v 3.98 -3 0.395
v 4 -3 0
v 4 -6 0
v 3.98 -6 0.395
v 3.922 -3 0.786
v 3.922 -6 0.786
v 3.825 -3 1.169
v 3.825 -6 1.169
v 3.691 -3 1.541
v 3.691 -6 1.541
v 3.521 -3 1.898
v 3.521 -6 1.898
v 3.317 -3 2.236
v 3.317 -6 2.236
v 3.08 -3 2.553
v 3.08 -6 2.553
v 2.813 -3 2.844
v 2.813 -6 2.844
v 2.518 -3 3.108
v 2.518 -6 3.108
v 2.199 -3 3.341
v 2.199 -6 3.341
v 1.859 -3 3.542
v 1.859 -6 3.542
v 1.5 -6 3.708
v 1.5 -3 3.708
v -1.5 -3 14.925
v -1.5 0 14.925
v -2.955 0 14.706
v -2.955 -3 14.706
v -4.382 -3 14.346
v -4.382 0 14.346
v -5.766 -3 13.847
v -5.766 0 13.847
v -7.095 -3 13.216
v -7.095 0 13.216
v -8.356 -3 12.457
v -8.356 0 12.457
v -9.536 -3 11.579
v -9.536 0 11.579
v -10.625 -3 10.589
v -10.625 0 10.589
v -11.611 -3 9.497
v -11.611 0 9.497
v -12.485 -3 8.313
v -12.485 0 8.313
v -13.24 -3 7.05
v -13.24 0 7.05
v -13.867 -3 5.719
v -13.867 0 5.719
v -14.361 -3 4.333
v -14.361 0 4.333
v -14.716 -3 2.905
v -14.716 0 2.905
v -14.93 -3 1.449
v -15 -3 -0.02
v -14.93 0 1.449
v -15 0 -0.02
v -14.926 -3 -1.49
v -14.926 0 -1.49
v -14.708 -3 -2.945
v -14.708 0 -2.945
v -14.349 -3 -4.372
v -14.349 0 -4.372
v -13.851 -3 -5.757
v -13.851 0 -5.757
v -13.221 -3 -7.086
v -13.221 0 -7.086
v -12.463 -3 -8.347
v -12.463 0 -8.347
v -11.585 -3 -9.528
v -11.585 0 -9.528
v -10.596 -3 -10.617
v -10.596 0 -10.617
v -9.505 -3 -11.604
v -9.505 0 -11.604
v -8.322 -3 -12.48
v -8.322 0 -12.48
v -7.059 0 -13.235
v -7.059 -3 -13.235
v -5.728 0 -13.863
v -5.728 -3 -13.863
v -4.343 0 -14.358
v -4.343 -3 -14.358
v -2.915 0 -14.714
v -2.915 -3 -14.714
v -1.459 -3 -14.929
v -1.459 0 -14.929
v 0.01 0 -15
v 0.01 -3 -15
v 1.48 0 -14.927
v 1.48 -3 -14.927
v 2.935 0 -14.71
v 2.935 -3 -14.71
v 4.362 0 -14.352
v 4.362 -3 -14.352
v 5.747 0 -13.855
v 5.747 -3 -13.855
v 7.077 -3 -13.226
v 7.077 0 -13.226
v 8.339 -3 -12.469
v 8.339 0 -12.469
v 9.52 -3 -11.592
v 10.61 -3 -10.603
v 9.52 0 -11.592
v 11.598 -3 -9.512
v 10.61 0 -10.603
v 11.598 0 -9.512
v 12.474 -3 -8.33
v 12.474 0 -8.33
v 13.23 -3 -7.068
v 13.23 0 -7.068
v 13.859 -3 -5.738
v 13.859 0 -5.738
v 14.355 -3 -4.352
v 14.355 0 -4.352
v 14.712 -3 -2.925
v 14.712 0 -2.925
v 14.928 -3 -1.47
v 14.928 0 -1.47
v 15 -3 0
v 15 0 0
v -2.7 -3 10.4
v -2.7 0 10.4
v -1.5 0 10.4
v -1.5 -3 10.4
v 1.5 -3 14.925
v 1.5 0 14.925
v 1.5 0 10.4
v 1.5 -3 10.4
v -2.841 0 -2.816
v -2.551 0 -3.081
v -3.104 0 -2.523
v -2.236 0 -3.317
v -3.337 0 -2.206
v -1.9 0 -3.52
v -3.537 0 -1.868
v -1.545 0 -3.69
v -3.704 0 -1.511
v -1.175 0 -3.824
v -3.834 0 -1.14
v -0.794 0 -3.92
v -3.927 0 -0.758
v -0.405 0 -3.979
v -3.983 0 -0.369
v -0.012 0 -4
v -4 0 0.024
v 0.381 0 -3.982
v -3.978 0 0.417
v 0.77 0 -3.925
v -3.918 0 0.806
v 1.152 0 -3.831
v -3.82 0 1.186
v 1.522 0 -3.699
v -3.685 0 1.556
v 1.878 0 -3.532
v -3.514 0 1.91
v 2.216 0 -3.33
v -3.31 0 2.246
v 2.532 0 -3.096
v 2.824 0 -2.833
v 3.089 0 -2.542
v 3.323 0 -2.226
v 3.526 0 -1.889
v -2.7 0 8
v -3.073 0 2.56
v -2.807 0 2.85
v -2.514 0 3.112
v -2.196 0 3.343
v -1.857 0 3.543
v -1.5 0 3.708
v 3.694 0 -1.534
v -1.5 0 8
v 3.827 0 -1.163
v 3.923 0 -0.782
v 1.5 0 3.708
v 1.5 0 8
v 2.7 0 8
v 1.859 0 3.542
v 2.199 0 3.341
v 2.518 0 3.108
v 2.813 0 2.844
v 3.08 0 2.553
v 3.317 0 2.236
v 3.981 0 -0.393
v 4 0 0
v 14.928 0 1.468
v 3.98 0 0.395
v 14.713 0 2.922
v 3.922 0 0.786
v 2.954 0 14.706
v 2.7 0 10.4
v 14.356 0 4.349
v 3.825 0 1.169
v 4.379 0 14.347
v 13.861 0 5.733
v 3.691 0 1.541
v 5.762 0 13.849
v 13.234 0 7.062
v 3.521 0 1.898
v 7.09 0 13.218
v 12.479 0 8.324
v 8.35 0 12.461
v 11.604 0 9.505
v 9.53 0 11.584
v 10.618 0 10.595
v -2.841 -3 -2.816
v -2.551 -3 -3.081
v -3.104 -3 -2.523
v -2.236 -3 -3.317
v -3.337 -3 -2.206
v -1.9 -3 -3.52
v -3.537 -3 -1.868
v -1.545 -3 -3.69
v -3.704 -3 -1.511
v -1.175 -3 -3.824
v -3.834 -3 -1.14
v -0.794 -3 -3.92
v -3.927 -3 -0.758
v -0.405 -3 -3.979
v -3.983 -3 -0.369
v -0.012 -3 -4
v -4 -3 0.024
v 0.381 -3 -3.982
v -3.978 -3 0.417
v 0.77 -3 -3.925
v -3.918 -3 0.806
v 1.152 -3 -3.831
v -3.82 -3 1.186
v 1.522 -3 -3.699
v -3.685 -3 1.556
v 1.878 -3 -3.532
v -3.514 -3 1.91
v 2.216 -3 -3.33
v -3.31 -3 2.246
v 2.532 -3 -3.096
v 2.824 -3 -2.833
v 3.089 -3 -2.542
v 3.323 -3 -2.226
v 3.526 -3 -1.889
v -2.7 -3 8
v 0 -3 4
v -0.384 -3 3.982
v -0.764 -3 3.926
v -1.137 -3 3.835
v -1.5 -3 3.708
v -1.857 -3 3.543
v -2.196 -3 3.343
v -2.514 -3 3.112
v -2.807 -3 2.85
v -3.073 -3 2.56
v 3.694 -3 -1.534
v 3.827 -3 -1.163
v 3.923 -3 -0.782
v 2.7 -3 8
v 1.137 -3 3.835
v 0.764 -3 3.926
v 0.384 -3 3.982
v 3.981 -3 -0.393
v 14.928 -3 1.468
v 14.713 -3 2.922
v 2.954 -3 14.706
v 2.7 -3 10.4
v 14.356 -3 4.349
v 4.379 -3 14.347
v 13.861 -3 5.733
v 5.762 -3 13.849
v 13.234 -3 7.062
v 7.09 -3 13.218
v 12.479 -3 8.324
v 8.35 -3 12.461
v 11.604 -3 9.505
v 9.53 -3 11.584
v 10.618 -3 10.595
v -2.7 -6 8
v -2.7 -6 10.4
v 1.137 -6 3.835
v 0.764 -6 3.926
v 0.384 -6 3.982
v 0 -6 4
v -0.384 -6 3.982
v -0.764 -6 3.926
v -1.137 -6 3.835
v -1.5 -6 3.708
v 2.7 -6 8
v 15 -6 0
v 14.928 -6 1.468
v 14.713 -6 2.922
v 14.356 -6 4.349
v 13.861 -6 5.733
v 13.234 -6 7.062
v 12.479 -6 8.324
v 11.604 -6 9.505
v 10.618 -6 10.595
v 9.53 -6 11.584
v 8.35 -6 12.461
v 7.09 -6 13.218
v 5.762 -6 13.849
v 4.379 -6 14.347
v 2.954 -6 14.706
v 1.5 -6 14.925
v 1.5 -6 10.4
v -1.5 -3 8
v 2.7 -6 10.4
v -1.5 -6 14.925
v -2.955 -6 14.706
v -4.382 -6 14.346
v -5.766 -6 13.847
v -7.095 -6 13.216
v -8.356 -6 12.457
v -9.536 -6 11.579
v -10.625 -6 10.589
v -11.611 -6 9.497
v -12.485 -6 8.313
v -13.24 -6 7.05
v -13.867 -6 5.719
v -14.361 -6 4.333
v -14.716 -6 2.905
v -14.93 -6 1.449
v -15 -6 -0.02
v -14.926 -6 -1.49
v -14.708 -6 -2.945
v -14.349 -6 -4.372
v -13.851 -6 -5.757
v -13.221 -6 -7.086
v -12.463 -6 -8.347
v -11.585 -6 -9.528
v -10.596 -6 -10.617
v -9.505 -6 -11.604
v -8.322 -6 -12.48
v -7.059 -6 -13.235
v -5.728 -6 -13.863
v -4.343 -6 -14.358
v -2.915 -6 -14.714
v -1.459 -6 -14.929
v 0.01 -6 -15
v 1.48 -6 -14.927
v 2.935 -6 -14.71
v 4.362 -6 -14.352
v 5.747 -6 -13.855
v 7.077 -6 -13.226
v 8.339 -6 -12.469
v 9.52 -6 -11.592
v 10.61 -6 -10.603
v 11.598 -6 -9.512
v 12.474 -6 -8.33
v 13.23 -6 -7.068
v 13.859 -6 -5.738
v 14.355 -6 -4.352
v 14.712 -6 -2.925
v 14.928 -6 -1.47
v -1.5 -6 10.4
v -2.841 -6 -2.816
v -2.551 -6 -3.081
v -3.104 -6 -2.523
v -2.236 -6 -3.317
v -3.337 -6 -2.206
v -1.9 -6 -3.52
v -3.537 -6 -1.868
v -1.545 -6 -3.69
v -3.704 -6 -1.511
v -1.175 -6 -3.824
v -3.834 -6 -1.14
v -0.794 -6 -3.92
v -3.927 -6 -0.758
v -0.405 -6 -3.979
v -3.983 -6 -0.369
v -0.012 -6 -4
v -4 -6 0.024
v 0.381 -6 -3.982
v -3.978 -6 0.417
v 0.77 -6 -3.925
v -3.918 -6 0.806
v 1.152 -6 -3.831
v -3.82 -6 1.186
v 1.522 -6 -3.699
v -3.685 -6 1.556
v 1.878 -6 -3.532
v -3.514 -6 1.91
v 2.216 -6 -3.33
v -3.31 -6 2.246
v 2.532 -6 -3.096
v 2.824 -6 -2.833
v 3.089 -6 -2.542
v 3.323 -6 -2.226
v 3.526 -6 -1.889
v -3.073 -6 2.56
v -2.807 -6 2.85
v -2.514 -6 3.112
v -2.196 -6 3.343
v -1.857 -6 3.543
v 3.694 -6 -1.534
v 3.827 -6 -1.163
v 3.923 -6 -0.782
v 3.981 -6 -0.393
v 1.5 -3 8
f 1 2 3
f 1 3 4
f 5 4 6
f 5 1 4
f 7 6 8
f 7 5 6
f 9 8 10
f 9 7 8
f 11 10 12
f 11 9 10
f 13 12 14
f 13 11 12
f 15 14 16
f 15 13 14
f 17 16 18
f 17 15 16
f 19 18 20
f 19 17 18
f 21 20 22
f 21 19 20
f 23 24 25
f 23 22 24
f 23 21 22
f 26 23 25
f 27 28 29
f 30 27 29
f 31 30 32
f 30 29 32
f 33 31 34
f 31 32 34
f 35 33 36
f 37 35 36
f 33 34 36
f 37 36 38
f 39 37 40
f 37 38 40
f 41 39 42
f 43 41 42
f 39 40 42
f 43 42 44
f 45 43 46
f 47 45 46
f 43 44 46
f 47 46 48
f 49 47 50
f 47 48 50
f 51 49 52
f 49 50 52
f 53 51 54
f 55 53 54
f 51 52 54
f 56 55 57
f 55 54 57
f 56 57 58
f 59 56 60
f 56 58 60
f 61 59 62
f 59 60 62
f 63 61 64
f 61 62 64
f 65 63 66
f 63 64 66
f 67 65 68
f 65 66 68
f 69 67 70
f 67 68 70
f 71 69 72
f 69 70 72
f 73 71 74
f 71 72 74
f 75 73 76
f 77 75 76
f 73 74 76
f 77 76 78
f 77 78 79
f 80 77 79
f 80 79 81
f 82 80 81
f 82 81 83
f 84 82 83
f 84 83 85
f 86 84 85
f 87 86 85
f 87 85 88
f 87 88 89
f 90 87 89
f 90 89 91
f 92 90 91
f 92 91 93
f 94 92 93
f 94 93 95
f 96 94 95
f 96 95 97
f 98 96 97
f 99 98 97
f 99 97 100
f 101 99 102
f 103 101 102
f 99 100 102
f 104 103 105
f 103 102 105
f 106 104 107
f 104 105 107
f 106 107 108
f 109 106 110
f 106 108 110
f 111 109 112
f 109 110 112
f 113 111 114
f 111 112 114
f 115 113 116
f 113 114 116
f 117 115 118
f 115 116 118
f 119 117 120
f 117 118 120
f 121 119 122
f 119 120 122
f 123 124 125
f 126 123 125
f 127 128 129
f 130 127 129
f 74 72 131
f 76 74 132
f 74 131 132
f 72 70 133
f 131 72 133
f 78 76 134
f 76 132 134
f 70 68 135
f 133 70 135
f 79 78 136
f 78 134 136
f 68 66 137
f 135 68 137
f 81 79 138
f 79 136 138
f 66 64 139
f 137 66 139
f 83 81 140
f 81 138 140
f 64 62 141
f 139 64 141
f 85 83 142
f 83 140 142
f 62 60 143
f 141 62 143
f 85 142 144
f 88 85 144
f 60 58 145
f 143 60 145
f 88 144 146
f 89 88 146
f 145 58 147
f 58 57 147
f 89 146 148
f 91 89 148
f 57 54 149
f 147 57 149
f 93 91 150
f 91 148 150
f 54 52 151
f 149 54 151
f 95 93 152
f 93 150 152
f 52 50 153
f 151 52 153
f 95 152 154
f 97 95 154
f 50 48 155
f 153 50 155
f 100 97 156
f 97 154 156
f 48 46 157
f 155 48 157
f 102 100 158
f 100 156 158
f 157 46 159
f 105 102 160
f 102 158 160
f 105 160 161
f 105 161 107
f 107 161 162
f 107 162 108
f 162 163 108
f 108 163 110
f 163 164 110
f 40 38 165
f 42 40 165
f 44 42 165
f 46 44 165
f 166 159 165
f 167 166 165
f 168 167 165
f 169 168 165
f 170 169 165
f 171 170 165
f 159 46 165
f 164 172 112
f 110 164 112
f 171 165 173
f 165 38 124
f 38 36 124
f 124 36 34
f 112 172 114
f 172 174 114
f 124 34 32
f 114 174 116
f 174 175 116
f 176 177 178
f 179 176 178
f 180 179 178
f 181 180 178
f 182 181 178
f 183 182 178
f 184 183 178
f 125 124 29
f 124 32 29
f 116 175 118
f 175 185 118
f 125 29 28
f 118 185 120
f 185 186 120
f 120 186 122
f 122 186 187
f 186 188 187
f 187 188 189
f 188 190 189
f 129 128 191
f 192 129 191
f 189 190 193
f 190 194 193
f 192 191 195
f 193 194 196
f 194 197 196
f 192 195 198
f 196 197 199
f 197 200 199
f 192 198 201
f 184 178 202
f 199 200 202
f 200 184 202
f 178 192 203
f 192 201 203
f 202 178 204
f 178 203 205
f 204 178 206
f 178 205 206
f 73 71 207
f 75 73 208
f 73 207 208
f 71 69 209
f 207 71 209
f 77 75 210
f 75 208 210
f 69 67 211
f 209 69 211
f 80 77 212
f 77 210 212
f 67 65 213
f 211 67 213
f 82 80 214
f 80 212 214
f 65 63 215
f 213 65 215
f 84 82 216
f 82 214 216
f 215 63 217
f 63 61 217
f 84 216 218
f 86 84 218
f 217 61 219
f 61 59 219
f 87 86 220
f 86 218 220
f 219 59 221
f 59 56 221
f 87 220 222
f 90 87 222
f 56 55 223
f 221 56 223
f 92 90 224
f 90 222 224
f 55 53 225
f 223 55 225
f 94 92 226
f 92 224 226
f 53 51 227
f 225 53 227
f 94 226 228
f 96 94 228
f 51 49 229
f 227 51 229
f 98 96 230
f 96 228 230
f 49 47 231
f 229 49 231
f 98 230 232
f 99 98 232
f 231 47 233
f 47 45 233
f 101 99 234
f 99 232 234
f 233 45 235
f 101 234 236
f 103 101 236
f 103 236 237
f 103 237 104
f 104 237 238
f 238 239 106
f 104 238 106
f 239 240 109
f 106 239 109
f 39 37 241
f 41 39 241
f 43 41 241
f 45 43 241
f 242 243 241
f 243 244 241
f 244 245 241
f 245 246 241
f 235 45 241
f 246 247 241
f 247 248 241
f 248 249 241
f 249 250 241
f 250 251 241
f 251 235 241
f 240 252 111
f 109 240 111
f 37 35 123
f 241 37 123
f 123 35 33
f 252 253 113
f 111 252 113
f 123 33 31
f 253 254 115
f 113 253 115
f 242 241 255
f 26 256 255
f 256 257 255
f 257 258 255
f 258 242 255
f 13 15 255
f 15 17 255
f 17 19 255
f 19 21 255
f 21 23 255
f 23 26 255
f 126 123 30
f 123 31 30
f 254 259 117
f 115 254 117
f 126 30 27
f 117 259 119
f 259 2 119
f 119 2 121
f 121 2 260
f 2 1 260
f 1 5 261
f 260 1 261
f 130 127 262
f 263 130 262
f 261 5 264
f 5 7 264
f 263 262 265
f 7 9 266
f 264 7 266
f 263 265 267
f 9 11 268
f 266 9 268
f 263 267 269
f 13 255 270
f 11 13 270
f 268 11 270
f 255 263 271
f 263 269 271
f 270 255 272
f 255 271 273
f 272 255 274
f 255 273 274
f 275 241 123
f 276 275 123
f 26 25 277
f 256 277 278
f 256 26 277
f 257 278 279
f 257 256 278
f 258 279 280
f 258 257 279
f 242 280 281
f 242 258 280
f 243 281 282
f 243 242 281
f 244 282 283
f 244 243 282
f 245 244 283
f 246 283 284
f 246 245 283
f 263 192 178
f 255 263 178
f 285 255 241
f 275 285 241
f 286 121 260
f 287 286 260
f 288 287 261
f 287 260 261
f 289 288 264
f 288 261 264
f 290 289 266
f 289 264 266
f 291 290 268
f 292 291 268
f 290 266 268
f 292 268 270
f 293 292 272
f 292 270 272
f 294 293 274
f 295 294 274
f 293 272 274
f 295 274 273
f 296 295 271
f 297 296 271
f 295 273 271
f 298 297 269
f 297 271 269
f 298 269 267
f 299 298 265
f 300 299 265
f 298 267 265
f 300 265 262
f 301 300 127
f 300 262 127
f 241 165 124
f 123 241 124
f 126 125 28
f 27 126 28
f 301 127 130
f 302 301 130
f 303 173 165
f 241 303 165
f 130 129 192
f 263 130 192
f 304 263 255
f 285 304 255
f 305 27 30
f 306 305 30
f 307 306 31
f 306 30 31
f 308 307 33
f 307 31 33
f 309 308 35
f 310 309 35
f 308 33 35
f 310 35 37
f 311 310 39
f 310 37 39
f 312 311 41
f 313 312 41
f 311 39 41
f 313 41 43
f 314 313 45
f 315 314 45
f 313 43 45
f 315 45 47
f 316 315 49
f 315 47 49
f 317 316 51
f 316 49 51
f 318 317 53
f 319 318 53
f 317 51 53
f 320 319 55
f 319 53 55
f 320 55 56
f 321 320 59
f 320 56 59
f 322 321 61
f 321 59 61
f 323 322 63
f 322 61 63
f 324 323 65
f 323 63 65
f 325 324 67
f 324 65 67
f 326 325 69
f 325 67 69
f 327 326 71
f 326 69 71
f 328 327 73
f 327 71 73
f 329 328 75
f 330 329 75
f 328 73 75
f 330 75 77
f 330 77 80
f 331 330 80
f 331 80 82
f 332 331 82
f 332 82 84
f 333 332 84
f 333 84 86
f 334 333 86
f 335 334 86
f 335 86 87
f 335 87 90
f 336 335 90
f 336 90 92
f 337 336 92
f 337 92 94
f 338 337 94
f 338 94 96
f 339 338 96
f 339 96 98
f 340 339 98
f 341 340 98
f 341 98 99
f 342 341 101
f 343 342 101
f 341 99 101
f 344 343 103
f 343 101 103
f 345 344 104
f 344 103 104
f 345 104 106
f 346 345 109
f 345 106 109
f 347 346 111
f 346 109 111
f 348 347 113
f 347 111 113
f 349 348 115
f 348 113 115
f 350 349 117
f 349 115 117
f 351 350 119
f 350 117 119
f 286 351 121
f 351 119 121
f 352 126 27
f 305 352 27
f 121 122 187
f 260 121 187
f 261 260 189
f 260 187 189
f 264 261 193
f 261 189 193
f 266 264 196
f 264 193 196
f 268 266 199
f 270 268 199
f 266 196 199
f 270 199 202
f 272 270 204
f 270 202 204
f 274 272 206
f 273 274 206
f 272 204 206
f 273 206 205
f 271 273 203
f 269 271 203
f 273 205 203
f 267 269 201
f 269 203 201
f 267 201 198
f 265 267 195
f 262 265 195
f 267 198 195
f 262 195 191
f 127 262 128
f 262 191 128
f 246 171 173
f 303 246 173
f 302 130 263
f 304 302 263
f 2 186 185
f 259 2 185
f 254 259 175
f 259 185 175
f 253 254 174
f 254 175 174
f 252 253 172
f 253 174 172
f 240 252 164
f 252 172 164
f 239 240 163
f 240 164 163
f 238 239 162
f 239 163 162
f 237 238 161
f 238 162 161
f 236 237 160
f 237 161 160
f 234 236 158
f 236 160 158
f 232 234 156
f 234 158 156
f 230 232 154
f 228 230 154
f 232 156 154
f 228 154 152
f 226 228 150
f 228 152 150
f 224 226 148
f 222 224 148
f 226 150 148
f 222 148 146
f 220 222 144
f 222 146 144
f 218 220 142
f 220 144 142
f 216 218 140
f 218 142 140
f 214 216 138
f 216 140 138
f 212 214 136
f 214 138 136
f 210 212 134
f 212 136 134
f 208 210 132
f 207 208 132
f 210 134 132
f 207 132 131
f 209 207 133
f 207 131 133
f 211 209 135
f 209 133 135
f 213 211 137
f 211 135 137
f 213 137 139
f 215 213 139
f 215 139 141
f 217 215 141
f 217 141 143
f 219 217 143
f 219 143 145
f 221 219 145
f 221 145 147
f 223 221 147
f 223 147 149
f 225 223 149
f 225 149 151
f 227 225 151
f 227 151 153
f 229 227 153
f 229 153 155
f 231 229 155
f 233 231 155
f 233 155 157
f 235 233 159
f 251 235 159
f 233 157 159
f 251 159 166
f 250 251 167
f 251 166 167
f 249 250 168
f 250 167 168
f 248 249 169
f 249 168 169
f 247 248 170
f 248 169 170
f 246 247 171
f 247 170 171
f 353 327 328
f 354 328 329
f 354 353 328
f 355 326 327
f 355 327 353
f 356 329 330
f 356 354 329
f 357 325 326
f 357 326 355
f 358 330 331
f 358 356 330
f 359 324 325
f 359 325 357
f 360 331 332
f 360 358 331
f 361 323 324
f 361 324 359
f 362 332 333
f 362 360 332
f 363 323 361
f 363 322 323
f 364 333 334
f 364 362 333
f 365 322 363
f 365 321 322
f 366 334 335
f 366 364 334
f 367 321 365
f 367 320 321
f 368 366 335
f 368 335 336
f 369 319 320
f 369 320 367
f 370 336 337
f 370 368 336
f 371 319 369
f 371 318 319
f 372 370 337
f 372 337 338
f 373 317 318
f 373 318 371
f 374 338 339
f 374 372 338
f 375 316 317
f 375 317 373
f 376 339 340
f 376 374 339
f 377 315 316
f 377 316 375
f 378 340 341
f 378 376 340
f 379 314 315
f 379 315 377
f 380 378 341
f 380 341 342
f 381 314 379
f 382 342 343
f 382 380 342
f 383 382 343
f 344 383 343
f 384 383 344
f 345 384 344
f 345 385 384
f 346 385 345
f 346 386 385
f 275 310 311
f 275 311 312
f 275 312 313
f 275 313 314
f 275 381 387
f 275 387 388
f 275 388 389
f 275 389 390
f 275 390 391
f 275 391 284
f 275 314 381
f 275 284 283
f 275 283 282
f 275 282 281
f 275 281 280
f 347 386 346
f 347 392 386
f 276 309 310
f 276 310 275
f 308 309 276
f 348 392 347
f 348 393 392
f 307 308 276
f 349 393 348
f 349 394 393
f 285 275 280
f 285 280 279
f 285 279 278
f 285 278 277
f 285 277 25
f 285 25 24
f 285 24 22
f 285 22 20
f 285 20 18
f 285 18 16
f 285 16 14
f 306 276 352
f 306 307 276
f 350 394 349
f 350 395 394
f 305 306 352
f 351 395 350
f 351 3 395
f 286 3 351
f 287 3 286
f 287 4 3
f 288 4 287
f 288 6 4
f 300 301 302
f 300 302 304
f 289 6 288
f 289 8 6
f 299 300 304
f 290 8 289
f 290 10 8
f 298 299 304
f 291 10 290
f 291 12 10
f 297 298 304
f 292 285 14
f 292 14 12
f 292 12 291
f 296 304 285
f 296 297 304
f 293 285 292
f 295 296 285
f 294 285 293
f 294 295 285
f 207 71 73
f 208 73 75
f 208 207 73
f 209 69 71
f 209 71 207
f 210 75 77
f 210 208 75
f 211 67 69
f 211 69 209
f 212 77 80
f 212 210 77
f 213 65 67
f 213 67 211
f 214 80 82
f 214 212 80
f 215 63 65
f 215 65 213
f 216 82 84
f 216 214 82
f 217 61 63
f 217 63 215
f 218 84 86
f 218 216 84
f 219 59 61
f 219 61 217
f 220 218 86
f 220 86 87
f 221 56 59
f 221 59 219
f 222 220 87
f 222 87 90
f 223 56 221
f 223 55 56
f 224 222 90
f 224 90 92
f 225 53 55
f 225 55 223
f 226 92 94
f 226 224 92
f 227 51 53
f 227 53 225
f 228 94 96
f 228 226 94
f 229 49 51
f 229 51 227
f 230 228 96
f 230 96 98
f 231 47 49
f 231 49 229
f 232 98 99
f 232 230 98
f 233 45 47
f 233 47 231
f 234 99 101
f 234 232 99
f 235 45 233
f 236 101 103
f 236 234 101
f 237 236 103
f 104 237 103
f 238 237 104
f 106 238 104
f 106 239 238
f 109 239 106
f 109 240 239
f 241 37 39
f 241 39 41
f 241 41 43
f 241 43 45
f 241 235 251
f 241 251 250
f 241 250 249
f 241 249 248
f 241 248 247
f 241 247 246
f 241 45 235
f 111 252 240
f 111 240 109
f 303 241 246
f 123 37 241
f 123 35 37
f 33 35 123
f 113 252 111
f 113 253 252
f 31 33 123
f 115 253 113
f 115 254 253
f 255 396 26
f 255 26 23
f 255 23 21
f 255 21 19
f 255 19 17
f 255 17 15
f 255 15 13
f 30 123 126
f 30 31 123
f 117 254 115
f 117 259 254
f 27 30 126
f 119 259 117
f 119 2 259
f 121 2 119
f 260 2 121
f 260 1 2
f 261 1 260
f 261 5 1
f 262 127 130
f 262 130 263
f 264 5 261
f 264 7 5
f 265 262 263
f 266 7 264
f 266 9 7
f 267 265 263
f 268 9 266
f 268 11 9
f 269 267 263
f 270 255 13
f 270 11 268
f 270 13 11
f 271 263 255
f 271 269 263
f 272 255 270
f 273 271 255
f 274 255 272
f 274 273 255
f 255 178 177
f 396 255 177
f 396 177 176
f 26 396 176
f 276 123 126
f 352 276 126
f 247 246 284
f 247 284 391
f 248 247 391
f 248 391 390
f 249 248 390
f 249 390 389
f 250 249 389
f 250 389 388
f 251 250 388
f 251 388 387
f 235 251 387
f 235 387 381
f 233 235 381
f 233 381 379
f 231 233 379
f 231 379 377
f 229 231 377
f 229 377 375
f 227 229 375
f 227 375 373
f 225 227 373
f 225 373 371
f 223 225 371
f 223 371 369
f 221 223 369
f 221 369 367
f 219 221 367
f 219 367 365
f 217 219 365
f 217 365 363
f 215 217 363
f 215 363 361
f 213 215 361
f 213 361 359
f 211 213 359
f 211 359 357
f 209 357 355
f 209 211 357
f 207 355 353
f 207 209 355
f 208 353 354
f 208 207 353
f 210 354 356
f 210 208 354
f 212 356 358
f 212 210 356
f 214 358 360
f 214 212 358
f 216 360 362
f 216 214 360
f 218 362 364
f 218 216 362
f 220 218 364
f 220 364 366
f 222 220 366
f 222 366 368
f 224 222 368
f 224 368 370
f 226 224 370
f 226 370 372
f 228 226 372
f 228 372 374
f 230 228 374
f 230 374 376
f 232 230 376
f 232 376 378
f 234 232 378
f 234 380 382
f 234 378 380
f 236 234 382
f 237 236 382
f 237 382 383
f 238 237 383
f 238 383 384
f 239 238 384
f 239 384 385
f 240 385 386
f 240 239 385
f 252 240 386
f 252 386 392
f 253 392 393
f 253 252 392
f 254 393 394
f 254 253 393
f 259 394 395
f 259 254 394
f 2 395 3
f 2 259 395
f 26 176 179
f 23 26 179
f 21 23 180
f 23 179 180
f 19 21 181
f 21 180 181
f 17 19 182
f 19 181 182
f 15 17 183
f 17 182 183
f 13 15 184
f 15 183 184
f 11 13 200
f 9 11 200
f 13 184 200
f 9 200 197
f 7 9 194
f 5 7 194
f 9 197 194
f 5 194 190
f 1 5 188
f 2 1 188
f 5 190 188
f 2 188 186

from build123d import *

# Parameters (mm, degrees)
F1_DEPTH = 3
F3_DEPTH = 3
F4_DEPTH = 25


with BuildPart() as f1:
    # F0 (on Front) → F1 (new body)
    with BuildSketch(Plane.XZ):
        with BuildLine():
            ThreePointArc((-1.5, 14.9248115566), (-10.0623058987, -11.1242977306), (15, 0))
            ThreePointArc((15, 0), (11.1242977306, 10.0623058987), (1.5, 14.9248115566))
            Line((1.5, 14.9248115566), (1.5, 10.4))
            Line((1.5, 10.4), (2.7, 10.4))
            Line((2.7, 10.4), (2.7, 8))
            Line((2.7, 8), (1.5, 8))
            Line((1.5, 8), (1.5, 3.7080992435))
            ThreePointArc((1.5, 3.7080992435), (3.3166247904, 2.2360679775), (4, 0))
            ThreePointArc((4, 0), (-2.2360679775, -3.3166247904), (-1.5, 3.7080992435))
            Line((-1.5, 3.7080992435), (-1.5, 8))
            Line((-1.5, 8), (-2.7, 8))
            Line((-2.7, 8), (-2.7, 10.4))
            Line((-2.7, 10.4), (-1.5, 10.4))
            Line((-1.5, 10.4), (-1.5, 14.9248115566))
        make_face()
    extrude(amount=F1_DEPTH)


with BuildPart() as f3:
    # F2 (on face) → F3 (new body)
    with BuildSketch(Plane.XZ.offset(3)):
        with BuildLine():
            ThreePointArc((-2.7, 9.6286032217), (-6.0415229868, -7.9686887253), (10, 0))
            ThreePointArc((10, 0), (7.9686887253, 6.0415229868), (2.7, 9.6286032217))
            Line((2.7, 9.6286032217), (2.7, 8))
            Line((2.7, 8), (1.5, 8))
            Line((1.5, 8), (1.5, 3.7080992435))
            ThreePointArc((1.5, 3.7080992435), (3.3166247904, 2.2360679775), (4, 0))
            ThreePointArc((4, 0), (-2.2360679775, -3.3166247904), (-1.5, 3.7080992435))
            Line((-1.5, 3.7080992435), (-1.5, 8))
            Line((-1.5, 8), (-2.7, 8))
            Line((-2.7, 8), (-2.7, 9.6286032217))
        make_face()
        with BuildLine():
            ThreePointArc((2.7, 9.6286032217), (7.9686887253, 6.0415229868), (10, 0))
            ThreePointArc((10, 0), (-6.0415229868, -7.9686887253), (-2.7, 9.6286032217))
            Line((-2.7, 9.6286032217), (-2.7, 10.4))
            Line((-2.7, 10.4), (-1.5, 10.4))
            Line((-1.5, 10.4), (-1.5, 14.9248115566))
            ThreePointArc((-1.5, 14.9248115566), (-10.0623058987, -11.1242977306), (15, 0))
            ThreePointArc((15, 0), (11.1242977306, 10.0623058987), (1.5, 14.9248115566))
            Line((1.5, 14.9248115566), (1.5, 10.4))
            Line((1.5, 10.4), (2.7, 10.4))
            Line((2.7, 10.4), (2.7, 9.6286032217))
        make_face()
        with BuildLine():
            Line((1.5, 3.7080992435), (1.5, 8))
            Line((1.5, 8), (-1.5, 8))
            Line((-1.5, 8), (-1.5, 3.7080992435))
            ThreePointArc((-1.5, 3.7080992435), (0, 4), (1.5, 3.7080992435))
        make_face()
        with BuildLine():
            ThreePointArc((4, 0), (3.3166247904, 2.2360679775), (1.5, 3.7080992435))
            ThreePointArc((1.5, 3.7080992435), (0, 4), (-1.5, 3.7080992435))
            ThreePointArc((-1.5, 3.7080992435), (-2.2360679775, -3.3166247904), (4, 0))
        make_face()
    extrude(amount=F3_DEPTH)

    # F2 (on face) → F4 (cut)
    with BuildSketch(Plane.XZ.offset(3)):
        with BuildLine():
            ThreePointArc((4, 0), (3.3166247904, 2.2360679775), (1.5, 3.7080992435))
            ThreePointArc((1.5, 3.7080992435), (0, 4), (-1.5, 3.7080992435))
            ThreePointArc((-1.5, 3.7080992435), (-2.2360679775, -3.3166247904), (4, 0))
        make_face()
    extrude(amount=F4_DEPTH, mode=Mode.SUBTRACT)


solid = Compound([f1.part, f3.part])
